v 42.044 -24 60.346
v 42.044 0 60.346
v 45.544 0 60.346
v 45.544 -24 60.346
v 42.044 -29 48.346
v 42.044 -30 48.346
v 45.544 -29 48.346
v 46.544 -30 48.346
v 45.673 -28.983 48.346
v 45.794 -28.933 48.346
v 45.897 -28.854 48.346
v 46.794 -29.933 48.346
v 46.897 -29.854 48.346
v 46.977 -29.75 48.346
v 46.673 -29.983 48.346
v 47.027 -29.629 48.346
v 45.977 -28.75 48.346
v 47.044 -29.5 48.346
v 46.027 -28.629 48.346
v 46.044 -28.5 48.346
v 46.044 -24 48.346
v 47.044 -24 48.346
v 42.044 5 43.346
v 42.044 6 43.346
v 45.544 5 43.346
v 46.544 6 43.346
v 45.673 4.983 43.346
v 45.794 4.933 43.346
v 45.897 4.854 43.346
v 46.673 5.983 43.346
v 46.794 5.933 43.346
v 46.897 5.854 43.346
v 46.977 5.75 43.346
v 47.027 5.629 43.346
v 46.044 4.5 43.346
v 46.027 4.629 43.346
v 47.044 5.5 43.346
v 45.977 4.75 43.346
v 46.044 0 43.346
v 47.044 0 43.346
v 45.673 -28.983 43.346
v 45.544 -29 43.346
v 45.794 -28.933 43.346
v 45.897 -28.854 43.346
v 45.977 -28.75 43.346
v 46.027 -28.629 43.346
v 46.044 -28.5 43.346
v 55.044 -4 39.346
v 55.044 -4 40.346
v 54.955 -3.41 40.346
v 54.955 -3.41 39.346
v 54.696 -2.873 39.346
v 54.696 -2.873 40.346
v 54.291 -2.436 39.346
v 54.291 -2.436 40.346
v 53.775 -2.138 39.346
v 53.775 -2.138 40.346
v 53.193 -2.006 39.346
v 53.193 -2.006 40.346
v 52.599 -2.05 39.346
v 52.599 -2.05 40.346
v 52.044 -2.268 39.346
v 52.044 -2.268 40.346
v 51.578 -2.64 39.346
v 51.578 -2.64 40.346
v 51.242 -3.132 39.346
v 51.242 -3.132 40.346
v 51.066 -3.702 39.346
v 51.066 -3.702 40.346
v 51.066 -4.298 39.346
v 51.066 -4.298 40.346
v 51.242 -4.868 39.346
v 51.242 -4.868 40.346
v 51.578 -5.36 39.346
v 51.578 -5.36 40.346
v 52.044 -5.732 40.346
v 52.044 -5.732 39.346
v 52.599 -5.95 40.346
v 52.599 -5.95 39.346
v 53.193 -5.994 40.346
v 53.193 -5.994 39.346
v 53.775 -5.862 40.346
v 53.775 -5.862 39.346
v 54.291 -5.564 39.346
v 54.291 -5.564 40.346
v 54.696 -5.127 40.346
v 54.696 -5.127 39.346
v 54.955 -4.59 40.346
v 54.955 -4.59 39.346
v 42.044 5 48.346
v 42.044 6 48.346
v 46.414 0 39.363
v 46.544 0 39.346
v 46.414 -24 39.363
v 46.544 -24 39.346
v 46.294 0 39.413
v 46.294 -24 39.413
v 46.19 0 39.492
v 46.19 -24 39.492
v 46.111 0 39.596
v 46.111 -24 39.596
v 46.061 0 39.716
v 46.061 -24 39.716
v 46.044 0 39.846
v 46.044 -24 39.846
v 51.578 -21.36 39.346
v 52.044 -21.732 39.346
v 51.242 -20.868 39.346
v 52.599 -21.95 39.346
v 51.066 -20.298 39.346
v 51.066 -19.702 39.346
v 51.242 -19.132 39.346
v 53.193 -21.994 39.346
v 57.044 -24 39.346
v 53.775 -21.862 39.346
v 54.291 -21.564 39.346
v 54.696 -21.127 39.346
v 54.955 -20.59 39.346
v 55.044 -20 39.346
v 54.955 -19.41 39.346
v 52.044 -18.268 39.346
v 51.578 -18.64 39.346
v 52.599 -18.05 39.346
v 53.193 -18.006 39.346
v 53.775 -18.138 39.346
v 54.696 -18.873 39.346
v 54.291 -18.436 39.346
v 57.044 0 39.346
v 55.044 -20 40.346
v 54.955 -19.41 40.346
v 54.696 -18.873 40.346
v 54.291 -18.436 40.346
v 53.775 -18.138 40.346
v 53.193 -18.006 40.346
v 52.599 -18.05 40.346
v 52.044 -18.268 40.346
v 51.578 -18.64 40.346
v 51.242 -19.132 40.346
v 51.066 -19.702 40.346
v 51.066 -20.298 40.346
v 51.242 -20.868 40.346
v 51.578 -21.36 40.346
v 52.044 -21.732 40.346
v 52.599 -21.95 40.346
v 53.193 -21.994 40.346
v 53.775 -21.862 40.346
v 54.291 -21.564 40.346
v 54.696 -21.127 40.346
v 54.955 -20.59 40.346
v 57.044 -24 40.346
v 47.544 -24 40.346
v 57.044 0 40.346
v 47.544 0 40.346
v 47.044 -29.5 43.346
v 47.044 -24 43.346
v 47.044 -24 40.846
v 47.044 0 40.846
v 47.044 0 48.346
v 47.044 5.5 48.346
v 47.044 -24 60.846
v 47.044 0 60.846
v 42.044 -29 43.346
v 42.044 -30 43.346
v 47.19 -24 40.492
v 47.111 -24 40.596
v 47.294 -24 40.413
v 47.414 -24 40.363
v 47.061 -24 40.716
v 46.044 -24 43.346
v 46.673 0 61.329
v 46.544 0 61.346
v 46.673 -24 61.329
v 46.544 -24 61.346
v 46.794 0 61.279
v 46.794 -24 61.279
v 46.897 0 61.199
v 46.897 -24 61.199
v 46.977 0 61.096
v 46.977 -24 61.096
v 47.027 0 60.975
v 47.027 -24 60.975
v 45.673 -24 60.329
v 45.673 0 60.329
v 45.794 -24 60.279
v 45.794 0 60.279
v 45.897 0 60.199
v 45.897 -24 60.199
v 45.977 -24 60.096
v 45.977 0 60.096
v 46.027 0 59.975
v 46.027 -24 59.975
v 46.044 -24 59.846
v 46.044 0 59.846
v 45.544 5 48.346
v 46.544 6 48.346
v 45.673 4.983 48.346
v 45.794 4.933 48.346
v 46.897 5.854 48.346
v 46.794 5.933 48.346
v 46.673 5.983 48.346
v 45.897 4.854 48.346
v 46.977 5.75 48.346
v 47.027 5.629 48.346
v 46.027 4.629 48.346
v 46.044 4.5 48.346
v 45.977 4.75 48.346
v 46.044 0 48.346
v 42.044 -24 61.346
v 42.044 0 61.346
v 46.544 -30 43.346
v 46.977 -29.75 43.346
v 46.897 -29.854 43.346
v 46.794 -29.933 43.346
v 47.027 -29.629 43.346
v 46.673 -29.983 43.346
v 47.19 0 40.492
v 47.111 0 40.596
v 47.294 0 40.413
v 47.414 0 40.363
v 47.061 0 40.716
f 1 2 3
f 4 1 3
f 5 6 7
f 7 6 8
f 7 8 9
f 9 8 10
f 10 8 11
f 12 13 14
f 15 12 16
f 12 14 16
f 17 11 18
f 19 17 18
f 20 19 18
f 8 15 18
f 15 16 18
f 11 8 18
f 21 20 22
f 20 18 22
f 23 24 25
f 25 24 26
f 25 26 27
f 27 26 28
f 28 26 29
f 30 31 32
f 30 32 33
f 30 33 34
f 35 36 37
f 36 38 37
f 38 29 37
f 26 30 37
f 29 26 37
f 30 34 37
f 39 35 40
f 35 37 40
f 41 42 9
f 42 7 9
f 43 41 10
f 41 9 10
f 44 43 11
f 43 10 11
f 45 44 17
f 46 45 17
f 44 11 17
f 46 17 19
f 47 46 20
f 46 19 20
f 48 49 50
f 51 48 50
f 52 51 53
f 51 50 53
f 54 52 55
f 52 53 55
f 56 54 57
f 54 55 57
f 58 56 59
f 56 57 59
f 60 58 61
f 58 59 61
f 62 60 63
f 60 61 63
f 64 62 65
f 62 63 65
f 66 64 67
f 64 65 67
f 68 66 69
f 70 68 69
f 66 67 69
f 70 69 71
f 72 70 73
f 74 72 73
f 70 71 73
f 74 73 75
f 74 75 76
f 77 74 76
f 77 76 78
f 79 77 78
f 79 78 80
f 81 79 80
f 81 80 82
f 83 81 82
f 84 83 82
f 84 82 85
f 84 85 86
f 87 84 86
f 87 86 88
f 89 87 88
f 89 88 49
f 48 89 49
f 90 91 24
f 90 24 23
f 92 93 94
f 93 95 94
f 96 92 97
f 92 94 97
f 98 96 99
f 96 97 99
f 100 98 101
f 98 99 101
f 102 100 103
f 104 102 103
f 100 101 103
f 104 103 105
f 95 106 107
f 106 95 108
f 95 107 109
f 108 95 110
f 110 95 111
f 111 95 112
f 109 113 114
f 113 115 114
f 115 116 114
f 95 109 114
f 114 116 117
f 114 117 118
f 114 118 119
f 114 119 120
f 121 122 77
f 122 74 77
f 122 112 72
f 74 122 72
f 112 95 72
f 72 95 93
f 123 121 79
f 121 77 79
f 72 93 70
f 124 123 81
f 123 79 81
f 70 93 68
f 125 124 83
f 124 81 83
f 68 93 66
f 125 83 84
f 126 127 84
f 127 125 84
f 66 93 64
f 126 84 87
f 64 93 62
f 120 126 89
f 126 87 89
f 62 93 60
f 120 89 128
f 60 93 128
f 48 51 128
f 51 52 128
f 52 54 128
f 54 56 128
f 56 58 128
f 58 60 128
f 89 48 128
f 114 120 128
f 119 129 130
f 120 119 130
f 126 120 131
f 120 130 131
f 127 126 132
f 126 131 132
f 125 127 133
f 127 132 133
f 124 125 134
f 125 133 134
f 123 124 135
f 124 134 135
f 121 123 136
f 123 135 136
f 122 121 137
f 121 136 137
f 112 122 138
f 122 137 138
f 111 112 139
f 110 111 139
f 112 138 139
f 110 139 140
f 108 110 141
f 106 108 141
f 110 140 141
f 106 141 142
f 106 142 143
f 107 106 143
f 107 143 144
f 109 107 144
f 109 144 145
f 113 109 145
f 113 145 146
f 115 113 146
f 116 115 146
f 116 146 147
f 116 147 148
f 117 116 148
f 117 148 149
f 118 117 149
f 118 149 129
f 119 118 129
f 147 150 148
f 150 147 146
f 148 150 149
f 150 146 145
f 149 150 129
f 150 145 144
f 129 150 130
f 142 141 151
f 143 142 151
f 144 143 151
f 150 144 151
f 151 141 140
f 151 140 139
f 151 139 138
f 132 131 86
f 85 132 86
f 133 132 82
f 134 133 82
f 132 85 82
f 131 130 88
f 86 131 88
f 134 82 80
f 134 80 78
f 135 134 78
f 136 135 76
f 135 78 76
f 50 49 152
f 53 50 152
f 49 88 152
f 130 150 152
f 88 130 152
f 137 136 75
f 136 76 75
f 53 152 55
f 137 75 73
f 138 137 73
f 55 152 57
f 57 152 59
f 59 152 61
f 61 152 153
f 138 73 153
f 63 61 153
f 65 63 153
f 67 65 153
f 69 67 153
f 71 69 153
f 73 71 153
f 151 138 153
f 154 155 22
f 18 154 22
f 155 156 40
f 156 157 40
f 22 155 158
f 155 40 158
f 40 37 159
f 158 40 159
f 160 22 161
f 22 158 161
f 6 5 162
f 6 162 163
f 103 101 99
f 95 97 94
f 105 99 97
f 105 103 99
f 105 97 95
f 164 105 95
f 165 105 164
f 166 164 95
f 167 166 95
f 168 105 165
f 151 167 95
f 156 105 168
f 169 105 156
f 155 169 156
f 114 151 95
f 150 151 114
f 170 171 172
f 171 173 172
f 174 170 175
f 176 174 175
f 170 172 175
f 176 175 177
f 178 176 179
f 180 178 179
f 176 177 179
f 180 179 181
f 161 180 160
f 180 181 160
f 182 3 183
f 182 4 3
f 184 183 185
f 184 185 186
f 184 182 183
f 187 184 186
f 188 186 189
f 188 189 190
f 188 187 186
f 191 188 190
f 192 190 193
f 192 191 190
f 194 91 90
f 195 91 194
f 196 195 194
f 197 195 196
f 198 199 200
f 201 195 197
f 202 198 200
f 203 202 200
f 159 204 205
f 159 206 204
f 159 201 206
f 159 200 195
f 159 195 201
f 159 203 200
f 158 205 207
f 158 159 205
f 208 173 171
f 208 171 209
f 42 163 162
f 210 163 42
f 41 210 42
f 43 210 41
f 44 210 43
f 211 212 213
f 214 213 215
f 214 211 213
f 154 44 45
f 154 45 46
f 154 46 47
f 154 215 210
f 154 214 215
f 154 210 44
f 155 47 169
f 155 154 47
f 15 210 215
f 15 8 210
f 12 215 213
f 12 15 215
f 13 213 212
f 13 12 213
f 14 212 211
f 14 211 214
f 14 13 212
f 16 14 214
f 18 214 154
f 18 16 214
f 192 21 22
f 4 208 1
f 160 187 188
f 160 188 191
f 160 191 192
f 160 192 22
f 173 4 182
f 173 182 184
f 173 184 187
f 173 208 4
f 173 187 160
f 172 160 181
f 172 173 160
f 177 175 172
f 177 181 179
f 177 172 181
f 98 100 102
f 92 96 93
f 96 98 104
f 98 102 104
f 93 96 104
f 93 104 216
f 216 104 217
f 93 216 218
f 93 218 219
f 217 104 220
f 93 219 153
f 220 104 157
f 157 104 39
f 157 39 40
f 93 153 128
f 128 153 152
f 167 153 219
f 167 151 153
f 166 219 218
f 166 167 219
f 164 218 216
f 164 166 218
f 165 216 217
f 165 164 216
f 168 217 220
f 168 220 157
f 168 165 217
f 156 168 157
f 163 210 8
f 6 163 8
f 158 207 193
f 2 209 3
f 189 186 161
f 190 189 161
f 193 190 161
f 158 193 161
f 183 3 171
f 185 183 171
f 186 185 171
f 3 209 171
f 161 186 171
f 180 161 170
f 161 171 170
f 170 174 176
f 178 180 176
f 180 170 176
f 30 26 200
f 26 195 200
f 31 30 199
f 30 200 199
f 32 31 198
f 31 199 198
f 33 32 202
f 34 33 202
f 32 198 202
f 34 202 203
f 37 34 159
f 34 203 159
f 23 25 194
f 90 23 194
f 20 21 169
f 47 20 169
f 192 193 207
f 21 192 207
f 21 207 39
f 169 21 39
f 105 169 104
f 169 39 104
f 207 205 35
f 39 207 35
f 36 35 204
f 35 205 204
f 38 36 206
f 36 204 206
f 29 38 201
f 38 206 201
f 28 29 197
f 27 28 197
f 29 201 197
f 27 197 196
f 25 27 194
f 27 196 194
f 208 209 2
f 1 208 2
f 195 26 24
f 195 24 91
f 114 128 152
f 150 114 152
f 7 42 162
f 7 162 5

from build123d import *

# Parameters (mm, degrees)
F1_DEPTH = 24
F2_R     = 2
F3_DEPTH = 2
F4_W     = 6
F4_H     = 5
F5_DEPTH = 1
F6_W     = 1
F6_H     = 5
F7_DEPTH = 4
F8_R     = 0.5


with BuildPart() as f1:
    # F0 (on Front) → F1 (new body)
    with BuildSketch(Plane.XZ):
        Polygon((57.043818, 40.345872), (47.043818, 40.345872), (47.043818, 61.345872), (42.043818, 61.345872), (42.043818, 60.345872), (46.043818, 60.345872), (46.043818, 39.345872), (57.043818, 39.345872), align=None)
    extrude(amount=F1_DEPTH)

    # F2 (on face) → F3 (cut)
    with BuildSketch(Plane.XY.offset(40.345872)):
        with Locations((53.043818, -20)):
            Circle(F2_R)
        with Locations((53.043818, -4)):
            Circle(F2_R)
    extrude(amount=-F3_DEPTH, mode=Mode.SUBTRACT)

    # F4 (on face) → F5 (join)
    with BuildSketch(Plane.YZ.offset(47.043818)):
        with Locations((-27, 45.845872)):
            Rectangle(F4_W, F4_H)
        with Locations((3, 45.845872)):
            Rectangle(F4_W, F4_H)
    extrude(amount=-F5_DEPTH)

    # F6 (on face) → F7 (join)
    with BuildSketch(Plane(origin=(46.043818, 0, 0), x_dir=(0, -1, 0), z_dir=(-1, 0, 0))):
        with Locations((-5.5, 45.845872)):
            Rectangle(F6_W, F6_H)
        with Locations((29.5, 45.845872)):
            Rectangle(F6_W, F6_H)
    extrude(amount=F7_DEPTH)

    # F8
    f8_edges = [f1.edges().sort_by_distance(p)[0] for p in [
        (47.043818, -12, 40.345872),
        (46.043818, -12, 39.345872),
        (47.043818, -12, 61.345872),
        (46.043818, -12, 60.345872),
        (47.043818, -30, 45.845872),
        (46.043818, -29, 45.845872),
        (46.043818, 5, 45.845872),
        (47.043818, 6, 45.845872),
    ]]
    fillet(f8_edges, radius=F8_R)


solid = f1.part
